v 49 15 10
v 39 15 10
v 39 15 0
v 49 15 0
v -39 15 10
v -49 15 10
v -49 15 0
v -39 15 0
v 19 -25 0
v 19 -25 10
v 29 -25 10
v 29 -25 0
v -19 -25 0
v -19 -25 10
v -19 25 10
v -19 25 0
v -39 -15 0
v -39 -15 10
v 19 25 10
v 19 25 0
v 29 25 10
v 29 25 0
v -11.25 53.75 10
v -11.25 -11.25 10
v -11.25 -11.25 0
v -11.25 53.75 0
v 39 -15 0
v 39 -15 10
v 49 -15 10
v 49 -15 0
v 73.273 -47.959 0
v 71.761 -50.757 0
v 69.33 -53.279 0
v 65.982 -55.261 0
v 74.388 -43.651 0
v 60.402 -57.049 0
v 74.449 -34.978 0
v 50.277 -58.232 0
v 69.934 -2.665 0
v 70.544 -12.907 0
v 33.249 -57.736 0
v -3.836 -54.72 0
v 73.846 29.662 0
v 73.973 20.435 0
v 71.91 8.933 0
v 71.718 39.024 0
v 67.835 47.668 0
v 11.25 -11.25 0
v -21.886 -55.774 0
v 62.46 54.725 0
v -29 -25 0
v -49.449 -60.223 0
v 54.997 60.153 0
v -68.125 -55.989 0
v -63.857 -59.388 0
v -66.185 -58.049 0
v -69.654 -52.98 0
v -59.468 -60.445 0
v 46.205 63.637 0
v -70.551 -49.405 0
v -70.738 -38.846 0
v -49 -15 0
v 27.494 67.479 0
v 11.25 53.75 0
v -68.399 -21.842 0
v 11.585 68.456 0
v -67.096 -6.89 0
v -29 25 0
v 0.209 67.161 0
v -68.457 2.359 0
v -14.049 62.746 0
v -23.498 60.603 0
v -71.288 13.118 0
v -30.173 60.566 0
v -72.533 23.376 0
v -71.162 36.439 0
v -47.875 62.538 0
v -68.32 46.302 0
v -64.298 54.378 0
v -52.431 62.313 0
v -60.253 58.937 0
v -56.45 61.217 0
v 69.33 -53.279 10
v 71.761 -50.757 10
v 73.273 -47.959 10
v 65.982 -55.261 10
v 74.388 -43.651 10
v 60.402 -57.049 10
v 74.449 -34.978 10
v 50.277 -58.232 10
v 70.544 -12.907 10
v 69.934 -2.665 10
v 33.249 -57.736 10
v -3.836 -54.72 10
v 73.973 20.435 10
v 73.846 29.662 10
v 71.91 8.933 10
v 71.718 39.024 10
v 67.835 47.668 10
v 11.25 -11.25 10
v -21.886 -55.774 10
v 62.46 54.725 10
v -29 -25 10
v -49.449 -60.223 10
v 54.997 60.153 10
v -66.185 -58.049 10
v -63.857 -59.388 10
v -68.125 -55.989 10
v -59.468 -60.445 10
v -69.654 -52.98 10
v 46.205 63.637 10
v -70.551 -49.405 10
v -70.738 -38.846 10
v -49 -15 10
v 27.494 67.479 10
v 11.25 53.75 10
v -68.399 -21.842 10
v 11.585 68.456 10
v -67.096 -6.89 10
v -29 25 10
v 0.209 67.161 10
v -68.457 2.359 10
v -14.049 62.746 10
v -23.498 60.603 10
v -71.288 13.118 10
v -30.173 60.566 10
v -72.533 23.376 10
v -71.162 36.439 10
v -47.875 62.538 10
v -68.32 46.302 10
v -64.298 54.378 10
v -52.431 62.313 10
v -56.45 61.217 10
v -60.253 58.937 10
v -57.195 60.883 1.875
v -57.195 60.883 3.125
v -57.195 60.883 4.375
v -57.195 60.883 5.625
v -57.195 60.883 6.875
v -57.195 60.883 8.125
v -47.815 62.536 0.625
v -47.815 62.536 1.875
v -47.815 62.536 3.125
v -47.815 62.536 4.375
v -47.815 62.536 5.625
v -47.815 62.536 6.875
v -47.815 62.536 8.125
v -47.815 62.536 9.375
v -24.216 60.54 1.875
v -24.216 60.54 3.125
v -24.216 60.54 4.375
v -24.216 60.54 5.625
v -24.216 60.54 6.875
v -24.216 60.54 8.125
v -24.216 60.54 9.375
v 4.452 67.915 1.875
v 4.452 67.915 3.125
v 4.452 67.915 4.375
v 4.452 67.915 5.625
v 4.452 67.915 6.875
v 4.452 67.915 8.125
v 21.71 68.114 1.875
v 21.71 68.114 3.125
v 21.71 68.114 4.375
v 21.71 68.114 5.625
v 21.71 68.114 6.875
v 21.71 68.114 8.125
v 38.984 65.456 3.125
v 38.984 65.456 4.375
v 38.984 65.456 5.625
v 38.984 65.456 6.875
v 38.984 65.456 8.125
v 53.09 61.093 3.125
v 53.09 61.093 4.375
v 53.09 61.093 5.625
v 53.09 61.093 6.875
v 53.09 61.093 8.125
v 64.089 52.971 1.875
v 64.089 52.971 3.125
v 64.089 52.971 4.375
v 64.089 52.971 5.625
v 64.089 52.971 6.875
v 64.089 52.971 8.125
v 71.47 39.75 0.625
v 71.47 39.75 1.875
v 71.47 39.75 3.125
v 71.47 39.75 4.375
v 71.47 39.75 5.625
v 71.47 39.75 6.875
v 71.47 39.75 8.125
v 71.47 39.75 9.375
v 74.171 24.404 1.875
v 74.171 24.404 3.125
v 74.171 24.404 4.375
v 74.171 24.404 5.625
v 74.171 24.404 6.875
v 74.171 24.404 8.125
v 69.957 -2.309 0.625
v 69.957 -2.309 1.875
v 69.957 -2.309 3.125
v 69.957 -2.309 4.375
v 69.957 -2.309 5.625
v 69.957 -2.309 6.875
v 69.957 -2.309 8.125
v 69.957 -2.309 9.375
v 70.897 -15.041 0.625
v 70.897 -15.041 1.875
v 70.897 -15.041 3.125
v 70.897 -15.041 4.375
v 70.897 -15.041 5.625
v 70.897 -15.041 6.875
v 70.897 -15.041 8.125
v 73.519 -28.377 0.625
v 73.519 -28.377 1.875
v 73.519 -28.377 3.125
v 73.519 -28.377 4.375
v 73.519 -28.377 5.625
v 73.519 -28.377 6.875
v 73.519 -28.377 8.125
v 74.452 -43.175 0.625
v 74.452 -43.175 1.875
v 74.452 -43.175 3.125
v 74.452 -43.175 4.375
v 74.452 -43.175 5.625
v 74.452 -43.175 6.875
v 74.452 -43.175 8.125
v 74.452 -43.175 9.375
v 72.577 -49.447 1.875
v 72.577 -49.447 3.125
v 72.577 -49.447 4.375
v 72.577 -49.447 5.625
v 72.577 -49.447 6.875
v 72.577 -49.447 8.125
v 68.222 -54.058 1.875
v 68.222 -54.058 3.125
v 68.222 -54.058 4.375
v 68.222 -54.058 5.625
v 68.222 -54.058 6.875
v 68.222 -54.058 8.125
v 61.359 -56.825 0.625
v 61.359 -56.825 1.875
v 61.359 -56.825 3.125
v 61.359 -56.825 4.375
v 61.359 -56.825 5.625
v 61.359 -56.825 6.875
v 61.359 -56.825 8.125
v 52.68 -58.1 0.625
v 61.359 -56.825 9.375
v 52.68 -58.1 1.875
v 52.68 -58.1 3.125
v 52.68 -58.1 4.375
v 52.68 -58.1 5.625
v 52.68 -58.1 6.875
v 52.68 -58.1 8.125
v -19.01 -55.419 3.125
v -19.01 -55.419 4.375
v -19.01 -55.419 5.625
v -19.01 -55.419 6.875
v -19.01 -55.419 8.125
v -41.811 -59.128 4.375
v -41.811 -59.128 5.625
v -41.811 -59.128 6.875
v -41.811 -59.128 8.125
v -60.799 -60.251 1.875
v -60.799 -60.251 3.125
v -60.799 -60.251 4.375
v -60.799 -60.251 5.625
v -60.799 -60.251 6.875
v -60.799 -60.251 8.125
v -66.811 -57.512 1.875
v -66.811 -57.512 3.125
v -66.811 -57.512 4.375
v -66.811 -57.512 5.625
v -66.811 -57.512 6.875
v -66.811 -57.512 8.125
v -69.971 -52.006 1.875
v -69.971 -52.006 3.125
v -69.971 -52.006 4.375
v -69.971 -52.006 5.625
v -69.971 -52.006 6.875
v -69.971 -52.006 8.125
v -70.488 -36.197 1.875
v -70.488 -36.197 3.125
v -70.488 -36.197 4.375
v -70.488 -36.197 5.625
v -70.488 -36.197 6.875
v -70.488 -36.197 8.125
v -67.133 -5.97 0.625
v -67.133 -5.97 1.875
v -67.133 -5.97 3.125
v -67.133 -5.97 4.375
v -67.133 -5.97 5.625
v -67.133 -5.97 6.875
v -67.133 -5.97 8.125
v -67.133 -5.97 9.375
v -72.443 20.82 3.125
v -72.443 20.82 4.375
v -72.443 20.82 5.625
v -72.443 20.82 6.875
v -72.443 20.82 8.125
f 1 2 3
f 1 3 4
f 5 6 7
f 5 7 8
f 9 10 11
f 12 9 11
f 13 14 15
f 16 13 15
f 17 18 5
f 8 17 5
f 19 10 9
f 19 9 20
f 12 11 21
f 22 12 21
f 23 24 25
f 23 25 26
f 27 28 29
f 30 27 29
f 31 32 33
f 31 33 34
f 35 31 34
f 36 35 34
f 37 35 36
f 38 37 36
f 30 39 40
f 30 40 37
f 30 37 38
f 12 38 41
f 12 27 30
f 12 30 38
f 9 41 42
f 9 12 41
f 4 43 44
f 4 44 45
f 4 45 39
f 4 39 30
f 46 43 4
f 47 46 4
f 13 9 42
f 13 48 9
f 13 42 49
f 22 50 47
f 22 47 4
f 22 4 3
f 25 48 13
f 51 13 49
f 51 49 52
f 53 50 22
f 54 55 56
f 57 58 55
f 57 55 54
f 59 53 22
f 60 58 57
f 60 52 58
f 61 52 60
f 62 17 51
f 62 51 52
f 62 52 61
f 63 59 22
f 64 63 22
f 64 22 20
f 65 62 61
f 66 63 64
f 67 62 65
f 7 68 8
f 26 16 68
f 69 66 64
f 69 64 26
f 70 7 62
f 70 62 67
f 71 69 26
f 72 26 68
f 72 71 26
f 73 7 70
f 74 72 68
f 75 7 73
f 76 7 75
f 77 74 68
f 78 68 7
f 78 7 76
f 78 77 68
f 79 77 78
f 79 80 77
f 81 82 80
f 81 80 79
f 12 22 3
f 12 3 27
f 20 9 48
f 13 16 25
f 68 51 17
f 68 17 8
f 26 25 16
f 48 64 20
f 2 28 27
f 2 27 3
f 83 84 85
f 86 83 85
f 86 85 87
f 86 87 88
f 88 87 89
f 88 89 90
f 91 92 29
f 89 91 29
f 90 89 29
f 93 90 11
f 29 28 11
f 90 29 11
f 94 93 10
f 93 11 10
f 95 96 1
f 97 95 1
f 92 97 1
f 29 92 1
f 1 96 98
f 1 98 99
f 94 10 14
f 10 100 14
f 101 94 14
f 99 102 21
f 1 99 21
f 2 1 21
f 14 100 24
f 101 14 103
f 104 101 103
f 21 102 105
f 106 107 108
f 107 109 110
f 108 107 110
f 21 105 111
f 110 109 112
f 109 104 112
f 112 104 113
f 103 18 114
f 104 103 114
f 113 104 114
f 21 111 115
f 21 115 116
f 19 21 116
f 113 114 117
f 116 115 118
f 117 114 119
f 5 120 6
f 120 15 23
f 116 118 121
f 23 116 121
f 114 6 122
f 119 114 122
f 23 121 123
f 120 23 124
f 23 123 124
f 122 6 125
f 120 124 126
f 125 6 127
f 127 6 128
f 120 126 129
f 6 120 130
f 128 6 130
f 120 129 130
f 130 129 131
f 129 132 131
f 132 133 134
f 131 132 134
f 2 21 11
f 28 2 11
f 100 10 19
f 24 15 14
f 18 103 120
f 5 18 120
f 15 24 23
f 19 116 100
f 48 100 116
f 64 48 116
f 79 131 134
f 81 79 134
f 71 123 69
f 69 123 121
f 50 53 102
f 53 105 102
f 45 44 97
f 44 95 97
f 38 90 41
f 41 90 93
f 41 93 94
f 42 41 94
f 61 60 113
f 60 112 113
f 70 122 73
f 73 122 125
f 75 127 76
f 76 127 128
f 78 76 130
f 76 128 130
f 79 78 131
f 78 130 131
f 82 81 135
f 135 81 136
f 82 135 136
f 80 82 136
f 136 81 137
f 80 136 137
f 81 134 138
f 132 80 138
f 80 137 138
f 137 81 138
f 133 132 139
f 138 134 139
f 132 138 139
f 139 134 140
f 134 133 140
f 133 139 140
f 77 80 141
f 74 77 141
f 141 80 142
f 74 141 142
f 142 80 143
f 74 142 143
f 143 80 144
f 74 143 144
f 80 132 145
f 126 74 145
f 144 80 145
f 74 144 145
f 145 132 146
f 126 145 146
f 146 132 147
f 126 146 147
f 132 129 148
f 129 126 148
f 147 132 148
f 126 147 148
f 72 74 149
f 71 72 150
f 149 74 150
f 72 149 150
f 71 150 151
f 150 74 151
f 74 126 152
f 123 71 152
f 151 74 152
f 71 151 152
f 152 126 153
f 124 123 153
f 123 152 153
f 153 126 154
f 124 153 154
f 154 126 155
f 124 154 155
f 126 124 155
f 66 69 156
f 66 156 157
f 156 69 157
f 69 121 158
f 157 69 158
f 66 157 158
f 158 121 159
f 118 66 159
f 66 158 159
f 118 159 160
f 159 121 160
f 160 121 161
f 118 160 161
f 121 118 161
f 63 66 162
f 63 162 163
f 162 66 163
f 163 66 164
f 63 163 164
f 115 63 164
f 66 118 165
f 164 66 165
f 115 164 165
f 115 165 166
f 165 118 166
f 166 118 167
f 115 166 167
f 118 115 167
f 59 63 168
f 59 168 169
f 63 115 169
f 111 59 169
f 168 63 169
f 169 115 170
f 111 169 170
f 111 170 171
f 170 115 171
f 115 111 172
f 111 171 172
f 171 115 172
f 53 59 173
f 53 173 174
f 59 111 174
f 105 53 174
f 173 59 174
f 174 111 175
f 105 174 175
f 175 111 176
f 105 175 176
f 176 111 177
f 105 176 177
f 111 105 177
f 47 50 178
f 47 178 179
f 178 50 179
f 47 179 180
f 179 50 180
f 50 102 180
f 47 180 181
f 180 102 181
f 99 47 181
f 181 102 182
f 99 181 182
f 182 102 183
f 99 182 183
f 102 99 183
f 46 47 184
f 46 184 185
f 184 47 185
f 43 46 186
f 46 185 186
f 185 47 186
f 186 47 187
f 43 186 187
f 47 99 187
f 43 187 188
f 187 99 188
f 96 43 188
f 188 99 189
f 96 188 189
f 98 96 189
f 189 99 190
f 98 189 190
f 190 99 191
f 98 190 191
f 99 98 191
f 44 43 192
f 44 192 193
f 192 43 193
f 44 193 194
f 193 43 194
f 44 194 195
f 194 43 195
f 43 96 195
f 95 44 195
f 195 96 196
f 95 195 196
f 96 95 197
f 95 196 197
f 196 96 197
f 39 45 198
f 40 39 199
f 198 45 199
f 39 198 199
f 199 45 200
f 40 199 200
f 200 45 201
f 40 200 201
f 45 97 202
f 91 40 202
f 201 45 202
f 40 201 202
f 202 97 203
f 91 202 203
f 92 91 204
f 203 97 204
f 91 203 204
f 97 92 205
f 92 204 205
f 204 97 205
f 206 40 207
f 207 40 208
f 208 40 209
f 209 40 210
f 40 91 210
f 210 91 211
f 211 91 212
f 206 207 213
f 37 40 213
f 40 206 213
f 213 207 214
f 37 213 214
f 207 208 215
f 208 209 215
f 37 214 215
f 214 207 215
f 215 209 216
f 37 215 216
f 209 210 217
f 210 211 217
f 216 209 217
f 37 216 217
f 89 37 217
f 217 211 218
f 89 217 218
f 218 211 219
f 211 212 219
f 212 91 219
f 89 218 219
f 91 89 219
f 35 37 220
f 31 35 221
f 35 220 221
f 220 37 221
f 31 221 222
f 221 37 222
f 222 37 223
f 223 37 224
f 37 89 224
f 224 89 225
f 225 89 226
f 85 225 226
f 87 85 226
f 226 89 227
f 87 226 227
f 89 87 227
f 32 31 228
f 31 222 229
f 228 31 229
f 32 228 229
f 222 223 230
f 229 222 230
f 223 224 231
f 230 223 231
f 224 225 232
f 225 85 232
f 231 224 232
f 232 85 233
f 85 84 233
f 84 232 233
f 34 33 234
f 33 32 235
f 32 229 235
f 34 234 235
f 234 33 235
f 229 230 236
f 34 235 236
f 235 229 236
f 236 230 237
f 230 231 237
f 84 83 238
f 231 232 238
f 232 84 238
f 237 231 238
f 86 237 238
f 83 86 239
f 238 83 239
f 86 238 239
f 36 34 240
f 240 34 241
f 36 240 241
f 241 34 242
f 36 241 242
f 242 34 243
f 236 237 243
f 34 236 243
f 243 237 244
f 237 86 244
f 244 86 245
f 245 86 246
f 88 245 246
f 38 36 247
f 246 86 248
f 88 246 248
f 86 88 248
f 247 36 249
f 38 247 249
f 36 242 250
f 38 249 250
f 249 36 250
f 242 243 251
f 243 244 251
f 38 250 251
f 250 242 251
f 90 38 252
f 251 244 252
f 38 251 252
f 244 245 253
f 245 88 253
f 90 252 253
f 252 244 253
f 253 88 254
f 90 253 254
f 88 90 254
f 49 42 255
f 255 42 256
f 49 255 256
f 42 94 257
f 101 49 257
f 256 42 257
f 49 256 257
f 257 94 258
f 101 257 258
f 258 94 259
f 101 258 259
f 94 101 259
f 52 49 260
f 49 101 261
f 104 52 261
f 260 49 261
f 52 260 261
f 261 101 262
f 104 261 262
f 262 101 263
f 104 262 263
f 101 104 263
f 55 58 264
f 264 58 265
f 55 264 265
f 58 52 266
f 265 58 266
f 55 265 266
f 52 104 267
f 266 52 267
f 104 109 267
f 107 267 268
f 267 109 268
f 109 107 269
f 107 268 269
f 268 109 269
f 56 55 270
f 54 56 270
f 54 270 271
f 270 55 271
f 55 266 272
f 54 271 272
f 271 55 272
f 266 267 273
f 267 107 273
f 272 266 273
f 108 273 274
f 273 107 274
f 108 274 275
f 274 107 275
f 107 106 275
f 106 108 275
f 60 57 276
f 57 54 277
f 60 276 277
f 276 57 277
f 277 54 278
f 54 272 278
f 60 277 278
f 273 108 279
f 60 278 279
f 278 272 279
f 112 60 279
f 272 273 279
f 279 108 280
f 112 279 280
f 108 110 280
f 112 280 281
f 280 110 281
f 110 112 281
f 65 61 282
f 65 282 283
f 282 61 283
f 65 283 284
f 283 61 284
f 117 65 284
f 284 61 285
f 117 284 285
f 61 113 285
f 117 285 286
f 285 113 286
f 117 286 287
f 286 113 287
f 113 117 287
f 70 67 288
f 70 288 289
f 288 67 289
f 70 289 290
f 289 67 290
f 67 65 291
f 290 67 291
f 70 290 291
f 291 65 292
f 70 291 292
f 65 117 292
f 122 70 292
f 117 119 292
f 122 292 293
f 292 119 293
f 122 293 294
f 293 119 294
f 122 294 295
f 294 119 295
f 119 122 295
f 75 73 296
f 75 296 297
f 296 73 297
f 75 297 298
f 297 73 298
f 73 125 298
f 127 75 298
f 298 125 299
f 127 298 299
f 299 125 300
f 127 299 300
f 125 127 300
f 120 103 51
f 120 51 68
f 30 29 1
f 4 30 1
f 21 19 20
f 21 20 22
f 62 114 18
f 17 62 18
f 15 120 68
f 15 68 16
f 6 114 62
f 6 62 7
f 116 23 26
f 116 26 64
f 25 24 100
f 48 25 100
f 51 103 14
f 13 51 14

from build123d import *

# Parameters (mm, degrees)
F0_W     = 125
F0_H     = 100
F1_DEPTH = 10
F2_W     = 10
F2_H     = 50
F3_DEPTH = 25
F4_W     = 10
F4_H     = 30
F5_DEPTH = 25
F6_W     = 125
F6_H     = 100
F7_DEPTH = 10
F8_W     = 22.5
F8_H     = 65
F9_DEPTH = 25


with BuildPart() as f1:
    # F0 (on Top) → F1 (new body)
    with BuildSketch(Plane.XY):
        Rectangle(F0_W, F0_H)
    extrude(amount=F1_DEPTH)

    # F2 (on face) → F3 (cut)
    with BuildSketch(Plane.XY.offset(10)):
        with Locations((-24, 0)):
            Rectangle(F2_W, F2_H)
        with Locations((24, 0)):
            Rectangle(F2_W, F2_H)
    extrude(amount=-F3_DEPTH, mode=Mode.SUBTRACT)

    # F4 (on face) → F5 (cut)
    with BuildSketch(Plane.XY.offset(10)):
        with Locations((-44, 0)):
            Rectangle(F4_W, F4_H)
        with Locations((44, 0)):
            Rectangle(F4_W, F4_H)
    extrude(amount=-F5_DEPTH, mode=Mode.SUBTRACT)

    # F6 (on face) → F7 (join)
    with BuildSketch(Plane.XY.offset(10)):
        with BuildLine():
            add(Edge.make_bspline(
                [(-64.2976015806, 54.3782301247), (-60.66151236, 59.8268472461), (-50.5377305405, 65.2797832082), (-22.8831858877, 56.7934533301), (1.2405644304, 70.9935806246), (39.2931049804, 66.6120535819), (66.1506720938, 57.3910469707), (78.089156159, 23.917701602), (66.873419545, -2.539113534), (74.2823706451, -27.1334559197), (76.7952058203, -58.9612049459), (28.8812859219, -58.8494990466), (-15.3054430227, -50.5504255768), (-70.9677630567, -68.3864889621), (-71.7694744464, -34.5814503254), (-63.7573321135, -4.023836256), (-76.2389304679, 19.4576593087), (-69.6054470834, 46.4245149849), (-64.2976015806, 54.3782301247)],
                knots=[0, 0, 0, 0, 0.0457172305, 0.1037886431, 0.1628725602, 0.2320487507, 0.2911738965, 0.3546407671, 0.4140563564, 0.4719496722, 0.5275438527, 0.5977323984, 0.6795108363, 0.7568521072, 0.811407923, 0.8754202652, 0.9332634648, 1, 1, 1, 1], degree=3))
        make_face()
        Rectangle(F6_W, F6_H, mode=Mode.SUBTRACT)
    extrude(amount=-F7_DEPTH)

    # F8 (on face) → F9 (cut)
    with BuildSketch(Plane.XY.offset(10)):
        with Locations((0, 21.25)):
            Rectangle(F8_W, F8_H)
    extrude(amount=-F9_DEPTH, mode=Mode.SUBTRACT)


solid = f1.part
